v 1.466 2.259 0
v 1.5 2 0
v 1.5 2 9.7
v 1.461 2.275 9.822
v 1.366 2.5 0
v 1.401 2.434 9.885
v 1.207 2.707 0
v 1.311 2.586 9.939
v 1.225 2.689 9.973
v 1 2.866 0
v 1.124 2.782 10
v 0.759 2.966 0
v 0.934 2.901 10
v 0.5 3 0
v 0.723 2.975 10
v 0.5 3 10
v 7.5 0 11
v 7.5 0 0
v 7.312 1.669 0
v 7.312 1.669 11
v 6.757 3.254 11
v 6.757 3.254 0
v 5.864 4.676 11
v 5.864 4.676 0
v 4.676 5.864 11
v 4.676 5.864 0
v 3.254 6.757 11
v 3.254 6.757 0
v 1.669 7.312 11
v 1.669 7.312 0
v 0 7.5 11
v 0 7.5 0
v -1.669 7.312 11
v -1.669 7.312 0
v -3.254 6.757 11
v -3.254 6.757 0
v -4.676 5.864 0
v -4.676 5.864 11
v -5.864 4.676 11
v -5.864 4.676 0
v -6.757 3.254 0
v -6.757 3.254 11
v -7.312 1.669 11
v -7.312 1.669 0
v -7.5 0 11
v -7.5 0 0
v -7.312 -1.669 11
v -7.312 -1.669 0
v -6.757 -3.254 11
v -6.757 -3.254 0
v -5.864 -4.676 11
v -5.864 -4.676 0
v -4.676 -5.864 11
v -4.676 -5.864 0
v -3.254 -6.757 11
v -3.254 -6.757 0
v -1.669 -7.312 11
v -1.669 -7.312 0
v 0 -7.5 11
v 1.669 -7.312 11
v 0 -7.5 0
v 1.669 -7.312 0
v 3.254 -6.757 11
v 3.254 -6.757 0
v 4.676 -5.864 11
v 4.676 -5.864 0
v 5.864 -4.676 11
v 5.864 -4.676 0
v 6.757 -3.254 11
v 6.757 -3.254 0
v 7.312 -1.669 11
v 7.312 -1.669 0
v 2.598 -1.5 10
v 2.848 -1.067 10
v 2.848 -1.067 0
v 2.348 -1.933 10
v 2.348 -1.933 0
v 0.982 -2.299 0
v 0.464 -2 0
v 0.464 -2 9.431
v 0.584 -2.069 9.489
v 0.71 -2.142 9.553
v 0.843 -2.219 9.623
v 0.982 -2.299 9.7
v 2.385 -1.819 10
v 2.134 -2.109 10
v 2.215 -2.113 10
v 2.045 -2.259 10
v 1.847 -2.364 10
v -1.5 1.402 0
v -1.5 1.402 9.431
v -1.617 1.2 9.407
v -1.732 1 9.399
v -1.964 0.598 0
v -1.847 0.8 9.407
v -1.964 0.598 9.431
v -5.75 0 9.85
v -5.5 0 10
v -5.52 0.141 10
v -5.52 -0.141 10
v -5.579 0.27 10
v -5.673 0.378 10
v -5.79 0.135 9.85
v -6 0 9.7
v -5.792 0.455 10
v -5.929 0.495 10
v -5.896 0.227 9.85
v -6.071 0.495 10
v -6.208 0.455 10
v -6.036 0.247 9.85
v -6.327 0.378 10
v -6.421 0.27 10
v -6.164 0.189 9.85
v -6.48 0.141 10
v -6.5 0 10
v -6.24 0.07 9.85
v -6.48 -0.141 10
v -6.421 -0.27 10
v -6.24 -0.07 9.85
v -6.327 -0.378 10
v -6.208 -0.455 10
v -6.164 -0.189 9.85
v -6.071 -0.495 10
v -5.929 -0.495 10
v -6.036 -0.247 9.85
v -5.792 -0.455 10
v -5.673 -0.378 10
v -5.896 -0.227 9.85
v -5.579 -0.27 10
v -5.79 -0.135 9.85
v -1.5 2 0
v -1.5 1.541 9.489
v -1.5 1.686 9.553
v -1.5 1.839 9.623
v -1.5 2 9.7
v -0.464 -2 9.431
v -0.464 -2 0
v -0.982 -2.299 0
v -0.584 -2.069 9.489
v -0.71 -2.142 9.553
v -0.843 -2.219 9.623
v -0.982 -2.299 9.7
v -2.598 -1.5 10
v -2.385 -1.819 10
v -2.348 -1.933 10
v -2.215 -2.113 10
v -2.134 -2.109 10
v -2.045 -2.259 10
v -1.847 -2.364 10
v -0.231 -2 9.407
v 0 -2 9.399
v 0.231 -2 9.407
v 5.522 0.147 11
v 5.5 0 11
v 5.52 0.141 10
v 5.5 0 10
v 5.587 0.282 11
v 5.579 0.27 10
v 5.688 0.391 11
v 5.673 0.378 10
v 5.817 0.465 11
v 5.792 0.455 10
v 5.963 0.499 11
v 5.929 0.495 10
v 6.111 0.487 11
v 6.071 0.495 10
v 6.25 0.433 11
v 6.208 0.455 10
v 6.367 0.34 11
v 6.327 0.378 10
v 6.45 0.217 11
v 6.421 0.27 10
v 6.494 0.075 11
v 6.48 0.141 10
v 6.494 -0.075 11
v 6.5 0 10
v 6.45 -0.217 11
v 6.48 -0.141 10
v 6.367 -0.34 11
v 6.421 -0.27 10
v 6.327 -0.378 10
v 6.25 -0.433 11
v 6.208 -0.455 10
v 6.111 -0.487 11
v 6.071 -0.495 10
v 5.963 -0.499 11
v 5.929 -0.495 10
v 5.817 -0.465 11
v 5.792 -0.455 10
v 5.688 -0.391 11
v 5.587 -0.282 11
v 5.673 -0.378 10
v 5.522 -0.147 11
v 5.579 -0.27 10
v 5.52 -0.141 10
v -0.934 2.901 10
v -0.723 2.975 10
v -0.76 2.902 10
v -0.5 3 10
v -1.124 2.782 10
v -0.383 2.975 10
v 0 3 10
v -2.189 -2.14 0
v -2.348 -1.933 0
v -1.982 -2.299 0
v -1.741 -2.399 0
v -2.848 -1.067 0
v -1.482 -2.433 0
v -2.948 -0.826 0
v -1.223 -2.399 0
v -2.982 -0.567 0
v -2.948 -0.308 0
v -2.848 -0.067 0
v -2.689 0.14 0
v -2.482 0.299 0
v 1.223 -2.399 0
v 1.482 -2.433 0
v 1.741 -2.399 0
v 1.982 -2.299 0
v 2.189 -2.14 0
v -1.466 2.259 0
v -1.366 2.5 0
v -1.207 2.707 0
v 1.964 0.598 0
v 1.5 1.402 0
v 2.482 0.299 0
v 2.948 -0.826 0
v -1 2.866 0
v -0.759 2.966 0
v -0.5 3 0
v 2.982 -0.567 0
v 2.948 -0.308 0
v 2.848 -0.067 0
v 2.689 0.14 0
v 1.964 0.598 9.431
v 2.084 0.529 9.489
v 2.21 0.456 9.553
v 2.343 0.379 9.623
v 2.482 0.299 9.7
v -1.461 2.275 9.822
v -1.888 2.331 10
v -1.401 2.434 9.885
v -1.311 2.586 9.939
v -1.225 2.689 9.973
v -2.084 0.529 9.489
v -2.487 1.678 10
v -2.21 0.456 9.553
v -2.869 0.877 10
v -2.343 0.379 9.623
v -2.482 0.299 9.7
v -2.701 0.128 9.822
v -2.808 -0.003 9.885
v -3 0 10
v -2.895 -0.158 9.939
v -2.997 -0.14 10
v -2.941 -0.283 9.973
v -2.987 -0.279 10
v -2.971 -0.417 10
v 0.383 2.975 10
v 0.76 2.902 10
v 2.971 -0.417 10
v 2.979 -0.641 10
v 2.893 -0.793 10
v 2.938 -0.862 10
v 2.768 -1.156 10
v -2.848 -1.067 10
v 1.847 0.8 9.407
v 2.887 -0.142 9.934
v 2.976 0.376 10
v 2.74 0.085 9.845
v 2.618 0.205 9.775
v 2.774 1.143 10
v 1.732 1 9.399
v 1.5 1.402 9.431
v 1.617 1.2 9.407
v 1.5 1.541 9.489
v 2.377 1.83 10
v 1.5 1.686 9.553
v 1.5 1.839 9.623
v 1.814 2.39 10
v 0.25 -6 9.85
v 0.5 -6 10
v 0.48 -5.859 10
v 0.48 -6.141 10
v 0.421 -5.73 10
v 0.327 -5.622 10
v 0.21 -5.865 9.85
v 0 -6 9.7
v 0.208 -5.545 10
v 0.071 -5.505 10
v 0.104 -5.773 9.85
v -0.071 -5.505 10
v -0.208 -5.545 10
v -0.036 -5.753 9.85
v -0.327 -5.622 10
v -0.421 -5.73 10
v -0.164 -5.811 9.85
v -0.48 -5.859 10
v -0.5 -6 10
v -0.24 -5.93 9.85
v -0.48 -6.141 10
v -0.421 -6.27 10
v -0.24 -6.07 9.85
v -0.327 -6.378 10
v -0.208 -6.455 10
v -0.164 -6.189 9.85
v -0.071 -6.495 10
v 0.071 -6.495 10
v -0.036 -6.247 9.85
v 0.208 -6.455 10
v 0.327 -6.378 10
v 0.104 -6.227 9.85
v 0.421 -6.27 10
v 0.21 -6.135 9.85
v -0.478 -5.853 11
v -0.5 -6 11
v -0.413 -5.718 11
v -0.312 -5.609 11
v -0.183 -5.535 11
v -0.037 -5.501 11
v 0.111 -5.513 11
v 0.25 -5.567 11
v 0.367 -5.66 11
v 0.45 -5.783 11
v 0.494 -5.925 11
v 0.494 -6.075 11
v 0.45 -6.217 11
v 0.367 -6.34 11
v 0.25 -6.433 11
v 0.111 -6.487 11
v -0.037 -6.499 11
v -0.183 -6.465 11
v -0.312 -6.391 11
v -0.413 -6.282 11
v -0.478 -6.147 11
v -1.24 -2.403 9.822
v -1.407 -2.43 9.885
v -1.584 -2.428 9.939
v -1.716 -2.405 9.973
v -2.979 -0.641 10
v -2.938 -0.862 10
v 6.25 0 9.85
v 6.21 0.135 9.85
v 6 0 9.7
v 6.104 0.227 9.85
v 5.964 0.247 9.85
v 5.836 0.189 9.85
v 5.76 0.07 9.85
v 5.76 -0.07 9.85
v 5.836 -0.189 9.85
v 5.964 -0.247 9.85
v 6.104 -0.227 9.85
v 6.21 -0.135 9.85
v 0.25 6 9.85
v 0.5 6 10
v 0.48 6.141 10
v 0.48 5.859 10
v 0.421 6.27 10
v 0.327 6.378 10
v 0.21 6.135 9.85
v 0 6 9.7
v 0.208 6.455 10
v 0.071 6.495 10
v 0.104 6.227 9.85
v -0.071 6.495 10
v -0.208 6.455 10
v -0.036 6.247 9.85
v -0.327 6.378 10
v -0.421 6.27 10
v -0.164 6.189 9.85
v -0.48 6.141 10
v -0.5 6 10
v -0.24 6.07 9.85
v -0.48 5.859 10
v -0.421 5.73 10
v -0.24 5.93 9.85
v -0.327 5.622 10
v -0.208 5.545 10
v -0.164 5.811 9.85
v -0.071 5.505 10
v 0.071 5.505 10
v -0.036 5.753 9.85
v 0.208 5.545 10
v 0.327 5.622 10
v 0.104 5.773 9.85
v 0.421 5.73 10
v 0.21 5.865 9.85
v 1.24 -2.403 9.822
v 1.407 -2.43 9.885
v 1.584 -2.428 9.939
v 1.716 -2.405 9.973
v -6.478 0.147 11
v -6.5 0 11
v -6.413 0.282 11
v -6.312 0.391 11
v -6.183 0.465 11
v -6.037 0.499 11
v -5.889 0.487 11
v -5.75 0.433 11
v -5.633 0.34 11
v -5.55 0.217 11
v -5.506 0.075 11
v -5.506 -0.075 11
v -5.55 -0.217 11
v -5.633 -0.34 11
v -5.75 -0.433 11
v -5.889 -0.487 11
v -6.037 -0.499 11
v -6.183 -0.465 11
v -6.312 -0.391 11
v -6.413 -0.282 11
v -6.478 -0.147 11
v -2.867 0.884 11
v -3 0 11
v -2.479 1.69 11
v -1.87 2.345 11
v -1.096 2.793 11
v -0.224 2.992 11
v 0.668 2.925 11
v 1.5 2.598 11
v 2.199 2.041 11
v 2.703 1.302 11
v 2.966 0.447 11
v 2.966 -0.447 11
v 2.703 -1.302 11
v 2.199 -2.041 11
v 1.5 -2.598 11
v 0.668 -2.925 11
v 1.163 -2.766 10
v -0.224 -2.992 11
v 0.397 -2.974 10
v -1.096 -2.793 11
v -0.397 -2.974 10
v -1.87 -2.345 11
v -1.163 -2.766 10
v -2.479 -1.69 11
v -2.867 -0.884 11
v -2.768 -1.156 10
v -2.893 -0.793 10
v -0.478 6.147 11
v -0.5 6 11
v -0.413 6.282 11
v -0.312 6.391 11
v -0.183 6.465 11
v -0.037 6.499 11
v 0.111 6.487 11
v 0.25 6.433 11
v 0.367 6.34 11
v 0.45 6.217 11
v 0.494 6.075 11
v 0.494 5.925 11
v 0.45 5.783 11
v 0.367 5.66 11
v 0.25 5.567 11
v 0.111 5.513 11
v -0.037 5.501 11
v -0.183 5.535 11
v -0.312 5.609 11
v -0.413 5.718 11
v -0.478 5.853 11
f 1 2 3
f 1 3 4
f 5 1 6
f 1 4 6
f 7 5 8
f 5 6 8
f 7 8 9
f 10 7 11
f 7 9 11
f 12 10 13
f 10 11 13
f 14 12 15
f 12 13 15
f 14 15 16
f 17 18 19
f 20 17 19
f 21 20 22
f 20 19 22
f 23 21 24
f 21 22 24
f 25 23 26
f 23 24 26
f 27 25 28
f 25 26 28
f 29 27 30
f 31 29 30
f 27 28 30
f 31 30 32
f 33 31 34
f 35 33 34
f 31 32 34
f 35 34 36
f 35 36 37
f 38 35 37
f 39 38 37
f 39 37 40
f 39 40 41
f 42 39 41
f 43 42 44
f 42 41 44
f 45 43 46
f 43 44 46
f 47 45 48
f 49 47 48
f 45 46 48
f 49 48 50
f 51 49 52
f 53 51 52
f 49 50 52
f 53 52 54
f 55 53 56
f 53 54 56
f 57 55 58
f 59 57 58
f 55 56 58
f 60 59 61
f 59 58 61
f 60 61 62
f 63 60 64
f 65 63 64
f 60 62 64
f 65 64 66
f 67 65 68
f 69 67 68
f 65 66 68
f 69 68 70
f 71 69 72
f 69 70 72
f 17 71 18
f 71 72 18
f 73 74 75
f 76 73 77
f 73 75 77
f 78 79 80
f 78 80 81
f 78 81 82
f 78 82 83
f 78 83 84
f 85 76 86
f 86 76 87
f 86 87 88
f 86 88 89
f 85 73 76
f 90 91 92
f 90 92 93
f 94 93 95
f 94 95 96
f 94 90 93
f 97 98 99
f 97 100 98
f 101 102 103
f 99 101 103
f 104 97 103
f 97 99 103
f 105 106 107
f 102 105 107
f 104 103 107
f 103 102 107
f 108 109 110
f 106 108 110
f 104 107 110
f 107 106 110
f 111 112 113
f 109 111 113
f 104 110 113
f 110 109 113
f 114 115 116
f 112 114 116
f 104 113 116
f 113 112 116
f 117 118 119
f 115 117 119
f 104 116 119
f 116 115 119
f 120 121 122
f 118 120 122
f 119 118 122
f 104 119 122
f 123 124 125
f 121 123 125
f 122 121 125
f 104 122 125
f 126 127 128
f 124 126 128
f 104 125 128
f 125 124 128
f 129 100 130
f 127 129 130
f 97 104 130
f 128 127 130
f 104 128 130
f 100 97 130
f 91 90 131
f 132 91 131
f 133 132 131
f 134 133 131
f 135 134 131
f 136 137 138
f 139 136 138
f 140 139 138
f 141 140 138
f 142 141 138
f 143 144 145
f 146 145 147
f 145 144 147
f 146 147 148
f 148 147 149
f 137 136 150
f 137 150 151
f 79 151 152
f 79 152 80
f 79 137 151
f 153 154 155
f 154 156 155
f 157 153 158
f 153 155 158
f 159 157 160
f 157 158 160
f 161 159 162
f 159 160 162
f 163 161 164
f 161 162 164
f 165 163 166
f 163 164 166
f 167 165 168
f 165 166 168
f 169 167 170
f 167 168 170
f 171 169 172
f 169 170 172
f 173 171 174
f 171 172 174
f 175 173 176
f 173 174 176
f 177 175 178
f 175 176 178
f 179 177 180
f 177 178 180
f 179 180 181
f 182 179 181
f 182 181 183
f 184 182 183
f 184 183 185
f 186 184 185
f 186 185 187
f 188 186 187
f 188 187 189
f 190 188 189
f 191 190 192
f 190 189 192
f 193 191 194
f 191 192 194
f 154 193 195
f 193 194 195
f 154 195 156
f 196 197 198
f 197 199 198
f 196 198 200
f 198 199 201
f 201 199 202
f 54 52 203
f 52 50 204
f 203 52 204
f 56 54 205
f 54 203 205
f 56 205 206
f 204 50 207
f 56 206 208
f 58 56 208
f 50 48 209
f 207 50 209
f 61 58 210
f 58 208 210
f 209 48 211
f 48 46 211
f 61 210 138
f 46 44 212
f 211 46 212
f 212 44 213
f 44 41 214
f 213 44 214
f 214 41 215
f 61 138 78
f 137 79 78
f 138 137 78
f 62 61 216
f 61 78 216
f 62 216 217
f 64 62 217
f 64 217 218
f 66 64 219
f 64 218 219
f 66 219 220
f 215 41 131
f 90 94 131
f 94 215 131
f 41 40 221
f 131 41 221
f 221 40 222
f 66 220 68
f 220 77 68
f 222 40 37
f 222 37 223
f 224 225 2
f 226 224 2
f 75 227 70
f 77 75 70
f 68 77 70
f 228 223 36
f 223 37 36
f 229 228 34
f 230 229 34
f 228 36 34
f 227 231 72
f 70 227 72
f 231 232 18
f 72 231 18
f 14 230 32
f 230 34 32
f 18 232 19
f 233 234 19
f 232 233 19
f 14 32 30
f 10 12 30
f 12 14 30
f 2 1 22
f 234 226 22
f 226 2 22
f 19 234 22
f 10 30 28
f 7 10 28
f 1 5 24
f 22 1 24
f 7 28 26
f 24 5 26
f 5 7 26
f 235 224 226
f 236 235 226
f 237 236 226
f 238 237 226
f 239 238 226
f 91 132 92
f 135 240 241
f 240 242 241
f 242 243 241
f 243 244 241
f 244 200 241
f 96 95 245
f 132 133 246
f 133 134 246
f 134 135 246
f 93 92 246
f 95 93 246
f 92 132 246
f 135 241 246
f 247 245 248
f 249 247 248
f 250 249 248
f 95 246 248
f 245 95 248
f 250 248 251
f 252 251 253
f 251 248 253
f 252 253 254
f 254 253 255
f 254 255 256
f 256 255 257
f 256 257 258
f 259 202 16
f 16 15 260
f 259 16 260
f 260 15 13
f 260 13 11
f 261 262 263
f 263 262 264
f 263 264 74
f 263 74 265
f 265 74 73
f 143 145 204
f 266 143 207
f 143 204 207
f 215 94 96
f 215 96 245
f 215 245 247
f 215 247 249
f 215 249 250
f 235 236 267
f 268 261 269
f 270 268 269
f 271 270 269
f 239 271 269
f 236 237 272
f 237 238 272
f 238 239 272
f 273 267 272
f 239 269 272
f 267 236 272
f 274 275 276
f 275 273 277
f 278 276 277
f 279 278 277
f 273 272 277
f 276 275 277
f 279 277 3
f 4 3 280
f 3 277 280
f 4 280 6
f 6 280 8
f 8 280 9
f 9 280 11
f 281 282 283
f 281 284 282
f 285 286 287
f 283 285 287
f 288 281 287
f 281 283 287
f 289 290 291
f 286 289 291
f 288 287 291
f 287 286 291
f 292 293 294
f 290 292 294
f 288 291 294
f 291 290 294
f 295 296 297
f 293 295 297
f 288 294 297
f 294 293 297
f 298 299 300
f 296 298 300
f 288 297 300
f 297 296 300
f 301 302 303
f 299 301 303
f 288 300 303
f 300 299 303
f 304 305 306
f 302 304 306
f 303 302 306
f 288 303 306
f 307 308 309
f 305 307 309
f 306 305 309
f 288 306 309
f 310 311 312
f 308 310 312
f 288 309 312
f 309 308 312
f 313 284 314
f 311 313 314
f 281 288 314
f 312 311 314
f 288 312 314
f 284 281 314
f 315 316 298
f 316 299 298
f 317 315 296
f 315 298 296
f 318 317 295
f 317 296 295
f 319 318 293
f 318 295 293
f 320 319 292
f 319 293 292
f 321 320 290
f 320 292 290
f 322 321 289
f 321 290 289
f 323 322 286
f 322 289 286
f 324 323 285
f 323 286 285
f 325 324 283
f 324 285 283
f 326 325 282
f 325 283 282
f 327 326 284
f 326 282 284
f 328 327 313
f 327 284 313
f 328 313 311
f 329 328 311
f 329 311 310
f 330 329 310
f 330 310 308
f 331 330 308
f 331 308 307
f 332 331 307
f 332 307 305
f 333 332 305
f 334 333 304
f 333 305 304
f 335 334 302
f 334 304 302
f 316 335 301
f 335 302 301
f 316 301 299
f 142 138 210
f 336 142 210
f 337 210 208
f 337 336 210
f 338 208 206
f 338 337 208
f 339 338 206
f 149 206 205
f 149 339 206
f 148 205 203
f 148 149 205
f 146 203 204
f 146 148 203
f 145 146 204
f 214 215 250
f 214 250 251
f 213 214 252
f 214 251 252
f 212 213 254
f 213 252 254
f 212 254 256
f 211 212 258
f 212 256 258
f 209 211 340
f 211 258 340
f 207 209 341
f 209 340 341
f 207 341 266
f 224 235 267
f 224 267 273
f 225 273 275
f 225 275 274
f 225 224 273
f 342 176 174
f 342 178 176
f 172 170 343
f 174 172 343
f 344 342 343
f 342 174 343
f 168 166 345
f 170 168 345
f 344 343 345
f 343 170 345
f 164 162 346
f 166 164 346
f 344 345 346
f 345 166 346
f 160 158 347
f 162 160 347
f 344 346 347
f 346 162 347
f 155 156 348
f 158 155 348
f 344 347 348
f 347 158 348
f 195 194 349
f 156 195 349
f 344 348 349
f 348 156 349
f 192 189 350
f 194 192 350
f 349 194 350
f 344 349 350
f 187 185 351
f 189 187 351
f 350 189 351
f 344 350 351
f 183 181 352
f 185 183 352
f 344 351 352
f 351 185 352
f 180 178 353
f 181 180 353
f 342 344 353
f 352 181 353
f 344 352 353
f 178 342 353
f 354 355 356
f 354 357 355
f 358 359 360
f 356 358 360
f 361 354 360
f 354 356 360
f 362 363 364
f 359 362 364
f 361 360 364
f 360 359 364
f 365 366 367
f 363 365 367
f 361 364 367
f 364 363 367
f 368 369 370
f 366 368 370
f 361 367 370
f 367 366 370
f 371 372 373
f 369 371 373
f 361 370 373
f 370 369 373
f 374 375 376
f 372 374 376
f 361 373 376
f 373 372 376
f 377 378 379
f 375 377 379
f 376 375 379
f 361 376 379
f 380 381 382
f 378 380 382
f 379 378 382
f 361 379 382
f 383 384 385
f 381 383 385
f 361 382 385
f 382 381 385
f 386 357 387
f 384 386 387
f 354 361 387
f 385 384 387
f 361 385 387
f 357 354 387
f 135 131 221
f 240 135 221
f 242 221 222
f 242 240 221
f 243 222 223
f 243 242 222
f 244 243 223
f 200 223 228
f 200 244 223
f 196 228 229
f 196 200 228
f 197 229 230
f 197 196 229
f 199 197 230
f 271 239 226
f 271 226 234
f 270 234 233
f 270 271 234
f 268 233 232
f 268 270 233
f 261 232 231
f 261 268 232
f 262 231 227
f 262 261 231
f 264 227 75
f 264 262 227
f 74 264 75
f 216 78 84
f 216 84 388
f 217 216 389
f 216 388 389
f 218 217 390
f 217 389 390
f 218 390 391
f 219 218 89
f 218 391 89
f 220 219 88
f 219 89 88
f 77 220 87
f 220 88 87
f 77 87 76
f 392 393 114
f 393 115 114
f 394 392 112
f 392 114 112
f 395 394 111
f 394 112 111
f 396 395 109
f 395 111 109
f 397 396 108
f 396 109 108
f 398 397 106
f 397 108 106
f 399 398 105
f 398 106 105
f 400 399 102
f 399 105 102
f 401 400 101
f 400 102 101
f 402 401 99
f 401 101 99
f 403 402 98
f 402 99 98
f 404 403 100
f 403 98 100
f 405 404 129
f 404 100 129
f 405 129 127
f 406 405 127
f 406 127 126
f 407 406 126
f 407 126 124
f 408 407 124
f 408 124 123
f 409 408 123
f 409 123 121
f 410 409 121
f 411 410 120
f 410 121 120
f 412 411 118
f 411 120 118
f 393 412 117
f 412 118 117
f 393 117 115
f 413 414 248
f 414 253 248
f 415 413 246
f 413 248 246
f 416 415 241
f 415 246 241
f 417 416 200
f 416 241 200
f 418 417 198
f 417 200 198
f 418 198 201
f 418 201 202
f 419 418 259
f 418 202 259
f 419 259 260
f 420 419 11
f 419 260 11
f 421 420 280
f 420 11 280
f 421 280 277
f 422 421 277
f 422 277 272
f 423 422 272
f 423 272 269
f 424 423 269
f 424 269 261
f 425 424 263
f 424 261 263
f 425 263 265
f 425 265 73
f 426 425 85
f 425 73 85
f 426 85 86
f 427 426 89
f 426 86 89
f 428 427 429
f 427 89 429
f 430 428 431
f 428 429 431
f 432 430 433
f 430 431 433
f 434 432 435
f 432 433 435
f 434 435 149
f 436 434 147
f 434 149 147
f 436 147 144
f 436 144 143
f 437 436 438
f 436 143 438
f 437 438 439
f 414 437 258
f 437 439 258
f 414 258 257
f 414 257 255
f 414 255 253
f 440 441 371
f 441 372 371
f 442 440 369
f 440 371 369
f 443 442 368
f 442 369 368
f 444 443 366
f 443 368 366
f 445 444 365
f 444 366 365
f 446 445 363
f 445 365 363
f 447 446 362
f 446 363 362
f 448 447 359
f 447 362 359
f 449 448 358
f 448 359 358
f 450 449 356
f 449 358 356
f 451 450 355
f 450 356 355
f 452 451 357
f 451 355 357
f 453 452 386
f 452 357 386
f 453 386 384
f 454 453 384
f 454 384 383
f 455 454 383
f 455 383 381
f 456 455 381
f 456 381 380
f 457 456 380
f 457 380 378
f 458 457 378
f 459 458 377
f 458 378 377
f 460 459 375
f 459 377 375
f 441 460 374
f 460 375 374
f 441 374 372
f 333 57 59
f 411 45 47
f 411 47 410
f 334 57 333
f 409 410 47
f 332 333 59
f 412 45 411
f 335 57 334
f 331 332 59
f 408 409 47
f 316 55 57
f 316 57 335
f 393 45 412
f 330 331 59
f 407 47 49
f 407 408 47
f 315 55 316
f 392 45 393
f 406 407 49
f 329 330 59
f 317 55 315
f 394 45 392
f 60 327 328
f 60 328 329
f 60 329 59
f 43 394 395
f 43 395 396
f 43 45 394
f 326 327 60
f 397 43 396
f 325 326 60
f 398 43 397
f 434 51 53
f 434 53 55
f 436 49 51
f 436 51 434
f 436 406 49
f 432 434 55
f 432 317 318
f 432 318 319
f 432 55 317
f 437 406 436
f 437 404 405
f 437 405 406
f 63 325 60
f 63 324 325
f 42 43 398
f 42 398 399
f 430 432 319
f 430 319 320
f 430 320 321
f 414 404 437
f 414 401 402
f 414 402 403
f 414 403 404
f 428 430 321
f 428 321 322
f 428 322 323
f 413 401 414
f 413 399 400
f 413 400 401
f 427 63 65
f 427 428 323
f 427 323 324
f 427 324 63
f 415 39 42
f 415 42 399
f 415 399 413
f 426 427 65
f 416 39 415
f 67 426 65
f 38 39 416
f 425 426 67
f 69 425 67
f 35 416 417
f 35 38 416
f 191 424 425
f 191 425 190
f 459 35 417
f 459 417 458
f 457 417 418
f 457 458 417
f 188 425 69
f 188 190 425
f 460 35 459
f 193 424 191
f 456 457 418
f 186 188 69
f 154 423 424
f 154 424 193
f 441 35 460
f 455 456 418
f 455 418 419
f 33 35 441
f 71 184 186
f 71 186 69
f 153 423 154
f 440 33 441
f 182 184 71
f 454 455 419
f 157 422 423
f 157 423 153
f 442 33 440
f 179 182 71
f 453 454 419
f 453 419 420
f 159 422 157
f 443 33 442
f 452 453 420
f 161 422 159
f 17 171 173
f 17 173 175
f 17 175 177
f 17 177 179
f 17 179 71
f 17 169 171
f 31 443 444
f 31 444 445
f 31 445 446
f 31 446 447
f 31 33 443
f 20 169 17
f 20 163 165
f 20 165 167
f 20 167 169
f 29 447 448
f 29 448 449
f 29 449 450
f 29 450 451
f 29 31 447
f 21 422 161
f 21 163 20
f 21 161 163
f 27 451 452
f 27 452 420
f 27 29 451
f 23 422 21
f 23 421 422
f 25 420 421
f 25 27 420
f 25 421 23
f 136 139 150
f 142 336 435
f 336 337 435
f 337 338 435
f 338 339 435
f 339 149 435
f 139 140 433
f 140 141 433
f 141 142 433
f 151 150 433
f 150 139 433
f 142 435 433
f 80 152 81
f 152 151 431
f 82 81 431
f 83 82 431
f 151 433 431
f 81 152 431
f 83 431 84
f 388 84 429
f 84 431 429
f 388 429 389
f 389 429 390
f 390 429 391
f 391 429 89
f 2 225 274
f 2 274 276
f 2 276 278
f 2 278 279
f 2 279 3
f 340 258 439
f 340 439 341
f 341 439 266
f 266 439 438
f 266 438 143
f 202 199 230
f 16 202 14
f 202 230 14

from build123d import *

# Parameters (mm, degrees)
F0_W      = 3
F0_H      = 5
F1_DEPTH  = 10
F2_R      = 1
F4_COUNT  = 3
F4_ANGLE  = 240
F5_R      = 7.5
F6_DEPTH  = 11
F9_D      = 1
F9_DEPTH  = 1
F9_TIP    = 0.3004303095
F10_D     = 6
F10_DEPTH = 1
F10_TIP   = 1.8025818571


with BuildPart() as f1:
    # F0 (on Top) → F1 (new body)
    with BuildSketch(Plane.XY):
        with Locations((0, 0.5)):
            Rectangle(F0_W, F0_H)
    extrude(amount=F1_DEPTH)

    # F2
    f2_edges = [f1.edges().sort_by_distance(p)[0] for p in [
        (-1.5, 3, 5),
        (1.5, 3, 5),
    ]]
    fillet(f2_edges, radius=F2_R)

    # F4: F1 ×3 about axis
    f4_axis = Axis((0, 0, 4.9742138945), (0, 0, -1))


with BuildPart() as f1_1:
    add(f1.part)
    for i in range(1, F4_COUNT):
        add(f1.part.rotate(f4_axis, i * F4_ANGLE / (F4_COUNT - 1)))


with BuildPart() as f6:
    # F5 (on Top) → F6 (new body)
    with BuildSketch(Plane.XY):
        Circle(F5_R)
    extrude(amount=F6_DEPTH)

    # F7: cut F1
    add(f1_1.part, mode=Mode.SUBTRACT)

    # F9
    with Locations(Plane.XY.offset(11)):
        with Locations((-6, 0), (6, 0), (0, 6), (0, -6)):
            Hole(F9_D / 2, depth=F9_DEPTH)
            with Locations((0, 0, -(F9_DEPTH + F9_TIP / 2))):  # 118° drill point
                Cone(0, F9_D / 2, F9_TIP, mode=Mode.SUBTRACT)

    # F10
    with Locations(Plane.XY.offset(11)):
        with Locations((0, 0)):
            Hole(F10_D / 2, depth=F10_DEPTH)
            with Locations((0, 0, -(F10_DEPTH + F10_TIP / 2))):  # 118° drill point
                Cone(0, F10_D / 2, F10_TIP, mode=Mode.SUBTRACT)


solid = f6.part
